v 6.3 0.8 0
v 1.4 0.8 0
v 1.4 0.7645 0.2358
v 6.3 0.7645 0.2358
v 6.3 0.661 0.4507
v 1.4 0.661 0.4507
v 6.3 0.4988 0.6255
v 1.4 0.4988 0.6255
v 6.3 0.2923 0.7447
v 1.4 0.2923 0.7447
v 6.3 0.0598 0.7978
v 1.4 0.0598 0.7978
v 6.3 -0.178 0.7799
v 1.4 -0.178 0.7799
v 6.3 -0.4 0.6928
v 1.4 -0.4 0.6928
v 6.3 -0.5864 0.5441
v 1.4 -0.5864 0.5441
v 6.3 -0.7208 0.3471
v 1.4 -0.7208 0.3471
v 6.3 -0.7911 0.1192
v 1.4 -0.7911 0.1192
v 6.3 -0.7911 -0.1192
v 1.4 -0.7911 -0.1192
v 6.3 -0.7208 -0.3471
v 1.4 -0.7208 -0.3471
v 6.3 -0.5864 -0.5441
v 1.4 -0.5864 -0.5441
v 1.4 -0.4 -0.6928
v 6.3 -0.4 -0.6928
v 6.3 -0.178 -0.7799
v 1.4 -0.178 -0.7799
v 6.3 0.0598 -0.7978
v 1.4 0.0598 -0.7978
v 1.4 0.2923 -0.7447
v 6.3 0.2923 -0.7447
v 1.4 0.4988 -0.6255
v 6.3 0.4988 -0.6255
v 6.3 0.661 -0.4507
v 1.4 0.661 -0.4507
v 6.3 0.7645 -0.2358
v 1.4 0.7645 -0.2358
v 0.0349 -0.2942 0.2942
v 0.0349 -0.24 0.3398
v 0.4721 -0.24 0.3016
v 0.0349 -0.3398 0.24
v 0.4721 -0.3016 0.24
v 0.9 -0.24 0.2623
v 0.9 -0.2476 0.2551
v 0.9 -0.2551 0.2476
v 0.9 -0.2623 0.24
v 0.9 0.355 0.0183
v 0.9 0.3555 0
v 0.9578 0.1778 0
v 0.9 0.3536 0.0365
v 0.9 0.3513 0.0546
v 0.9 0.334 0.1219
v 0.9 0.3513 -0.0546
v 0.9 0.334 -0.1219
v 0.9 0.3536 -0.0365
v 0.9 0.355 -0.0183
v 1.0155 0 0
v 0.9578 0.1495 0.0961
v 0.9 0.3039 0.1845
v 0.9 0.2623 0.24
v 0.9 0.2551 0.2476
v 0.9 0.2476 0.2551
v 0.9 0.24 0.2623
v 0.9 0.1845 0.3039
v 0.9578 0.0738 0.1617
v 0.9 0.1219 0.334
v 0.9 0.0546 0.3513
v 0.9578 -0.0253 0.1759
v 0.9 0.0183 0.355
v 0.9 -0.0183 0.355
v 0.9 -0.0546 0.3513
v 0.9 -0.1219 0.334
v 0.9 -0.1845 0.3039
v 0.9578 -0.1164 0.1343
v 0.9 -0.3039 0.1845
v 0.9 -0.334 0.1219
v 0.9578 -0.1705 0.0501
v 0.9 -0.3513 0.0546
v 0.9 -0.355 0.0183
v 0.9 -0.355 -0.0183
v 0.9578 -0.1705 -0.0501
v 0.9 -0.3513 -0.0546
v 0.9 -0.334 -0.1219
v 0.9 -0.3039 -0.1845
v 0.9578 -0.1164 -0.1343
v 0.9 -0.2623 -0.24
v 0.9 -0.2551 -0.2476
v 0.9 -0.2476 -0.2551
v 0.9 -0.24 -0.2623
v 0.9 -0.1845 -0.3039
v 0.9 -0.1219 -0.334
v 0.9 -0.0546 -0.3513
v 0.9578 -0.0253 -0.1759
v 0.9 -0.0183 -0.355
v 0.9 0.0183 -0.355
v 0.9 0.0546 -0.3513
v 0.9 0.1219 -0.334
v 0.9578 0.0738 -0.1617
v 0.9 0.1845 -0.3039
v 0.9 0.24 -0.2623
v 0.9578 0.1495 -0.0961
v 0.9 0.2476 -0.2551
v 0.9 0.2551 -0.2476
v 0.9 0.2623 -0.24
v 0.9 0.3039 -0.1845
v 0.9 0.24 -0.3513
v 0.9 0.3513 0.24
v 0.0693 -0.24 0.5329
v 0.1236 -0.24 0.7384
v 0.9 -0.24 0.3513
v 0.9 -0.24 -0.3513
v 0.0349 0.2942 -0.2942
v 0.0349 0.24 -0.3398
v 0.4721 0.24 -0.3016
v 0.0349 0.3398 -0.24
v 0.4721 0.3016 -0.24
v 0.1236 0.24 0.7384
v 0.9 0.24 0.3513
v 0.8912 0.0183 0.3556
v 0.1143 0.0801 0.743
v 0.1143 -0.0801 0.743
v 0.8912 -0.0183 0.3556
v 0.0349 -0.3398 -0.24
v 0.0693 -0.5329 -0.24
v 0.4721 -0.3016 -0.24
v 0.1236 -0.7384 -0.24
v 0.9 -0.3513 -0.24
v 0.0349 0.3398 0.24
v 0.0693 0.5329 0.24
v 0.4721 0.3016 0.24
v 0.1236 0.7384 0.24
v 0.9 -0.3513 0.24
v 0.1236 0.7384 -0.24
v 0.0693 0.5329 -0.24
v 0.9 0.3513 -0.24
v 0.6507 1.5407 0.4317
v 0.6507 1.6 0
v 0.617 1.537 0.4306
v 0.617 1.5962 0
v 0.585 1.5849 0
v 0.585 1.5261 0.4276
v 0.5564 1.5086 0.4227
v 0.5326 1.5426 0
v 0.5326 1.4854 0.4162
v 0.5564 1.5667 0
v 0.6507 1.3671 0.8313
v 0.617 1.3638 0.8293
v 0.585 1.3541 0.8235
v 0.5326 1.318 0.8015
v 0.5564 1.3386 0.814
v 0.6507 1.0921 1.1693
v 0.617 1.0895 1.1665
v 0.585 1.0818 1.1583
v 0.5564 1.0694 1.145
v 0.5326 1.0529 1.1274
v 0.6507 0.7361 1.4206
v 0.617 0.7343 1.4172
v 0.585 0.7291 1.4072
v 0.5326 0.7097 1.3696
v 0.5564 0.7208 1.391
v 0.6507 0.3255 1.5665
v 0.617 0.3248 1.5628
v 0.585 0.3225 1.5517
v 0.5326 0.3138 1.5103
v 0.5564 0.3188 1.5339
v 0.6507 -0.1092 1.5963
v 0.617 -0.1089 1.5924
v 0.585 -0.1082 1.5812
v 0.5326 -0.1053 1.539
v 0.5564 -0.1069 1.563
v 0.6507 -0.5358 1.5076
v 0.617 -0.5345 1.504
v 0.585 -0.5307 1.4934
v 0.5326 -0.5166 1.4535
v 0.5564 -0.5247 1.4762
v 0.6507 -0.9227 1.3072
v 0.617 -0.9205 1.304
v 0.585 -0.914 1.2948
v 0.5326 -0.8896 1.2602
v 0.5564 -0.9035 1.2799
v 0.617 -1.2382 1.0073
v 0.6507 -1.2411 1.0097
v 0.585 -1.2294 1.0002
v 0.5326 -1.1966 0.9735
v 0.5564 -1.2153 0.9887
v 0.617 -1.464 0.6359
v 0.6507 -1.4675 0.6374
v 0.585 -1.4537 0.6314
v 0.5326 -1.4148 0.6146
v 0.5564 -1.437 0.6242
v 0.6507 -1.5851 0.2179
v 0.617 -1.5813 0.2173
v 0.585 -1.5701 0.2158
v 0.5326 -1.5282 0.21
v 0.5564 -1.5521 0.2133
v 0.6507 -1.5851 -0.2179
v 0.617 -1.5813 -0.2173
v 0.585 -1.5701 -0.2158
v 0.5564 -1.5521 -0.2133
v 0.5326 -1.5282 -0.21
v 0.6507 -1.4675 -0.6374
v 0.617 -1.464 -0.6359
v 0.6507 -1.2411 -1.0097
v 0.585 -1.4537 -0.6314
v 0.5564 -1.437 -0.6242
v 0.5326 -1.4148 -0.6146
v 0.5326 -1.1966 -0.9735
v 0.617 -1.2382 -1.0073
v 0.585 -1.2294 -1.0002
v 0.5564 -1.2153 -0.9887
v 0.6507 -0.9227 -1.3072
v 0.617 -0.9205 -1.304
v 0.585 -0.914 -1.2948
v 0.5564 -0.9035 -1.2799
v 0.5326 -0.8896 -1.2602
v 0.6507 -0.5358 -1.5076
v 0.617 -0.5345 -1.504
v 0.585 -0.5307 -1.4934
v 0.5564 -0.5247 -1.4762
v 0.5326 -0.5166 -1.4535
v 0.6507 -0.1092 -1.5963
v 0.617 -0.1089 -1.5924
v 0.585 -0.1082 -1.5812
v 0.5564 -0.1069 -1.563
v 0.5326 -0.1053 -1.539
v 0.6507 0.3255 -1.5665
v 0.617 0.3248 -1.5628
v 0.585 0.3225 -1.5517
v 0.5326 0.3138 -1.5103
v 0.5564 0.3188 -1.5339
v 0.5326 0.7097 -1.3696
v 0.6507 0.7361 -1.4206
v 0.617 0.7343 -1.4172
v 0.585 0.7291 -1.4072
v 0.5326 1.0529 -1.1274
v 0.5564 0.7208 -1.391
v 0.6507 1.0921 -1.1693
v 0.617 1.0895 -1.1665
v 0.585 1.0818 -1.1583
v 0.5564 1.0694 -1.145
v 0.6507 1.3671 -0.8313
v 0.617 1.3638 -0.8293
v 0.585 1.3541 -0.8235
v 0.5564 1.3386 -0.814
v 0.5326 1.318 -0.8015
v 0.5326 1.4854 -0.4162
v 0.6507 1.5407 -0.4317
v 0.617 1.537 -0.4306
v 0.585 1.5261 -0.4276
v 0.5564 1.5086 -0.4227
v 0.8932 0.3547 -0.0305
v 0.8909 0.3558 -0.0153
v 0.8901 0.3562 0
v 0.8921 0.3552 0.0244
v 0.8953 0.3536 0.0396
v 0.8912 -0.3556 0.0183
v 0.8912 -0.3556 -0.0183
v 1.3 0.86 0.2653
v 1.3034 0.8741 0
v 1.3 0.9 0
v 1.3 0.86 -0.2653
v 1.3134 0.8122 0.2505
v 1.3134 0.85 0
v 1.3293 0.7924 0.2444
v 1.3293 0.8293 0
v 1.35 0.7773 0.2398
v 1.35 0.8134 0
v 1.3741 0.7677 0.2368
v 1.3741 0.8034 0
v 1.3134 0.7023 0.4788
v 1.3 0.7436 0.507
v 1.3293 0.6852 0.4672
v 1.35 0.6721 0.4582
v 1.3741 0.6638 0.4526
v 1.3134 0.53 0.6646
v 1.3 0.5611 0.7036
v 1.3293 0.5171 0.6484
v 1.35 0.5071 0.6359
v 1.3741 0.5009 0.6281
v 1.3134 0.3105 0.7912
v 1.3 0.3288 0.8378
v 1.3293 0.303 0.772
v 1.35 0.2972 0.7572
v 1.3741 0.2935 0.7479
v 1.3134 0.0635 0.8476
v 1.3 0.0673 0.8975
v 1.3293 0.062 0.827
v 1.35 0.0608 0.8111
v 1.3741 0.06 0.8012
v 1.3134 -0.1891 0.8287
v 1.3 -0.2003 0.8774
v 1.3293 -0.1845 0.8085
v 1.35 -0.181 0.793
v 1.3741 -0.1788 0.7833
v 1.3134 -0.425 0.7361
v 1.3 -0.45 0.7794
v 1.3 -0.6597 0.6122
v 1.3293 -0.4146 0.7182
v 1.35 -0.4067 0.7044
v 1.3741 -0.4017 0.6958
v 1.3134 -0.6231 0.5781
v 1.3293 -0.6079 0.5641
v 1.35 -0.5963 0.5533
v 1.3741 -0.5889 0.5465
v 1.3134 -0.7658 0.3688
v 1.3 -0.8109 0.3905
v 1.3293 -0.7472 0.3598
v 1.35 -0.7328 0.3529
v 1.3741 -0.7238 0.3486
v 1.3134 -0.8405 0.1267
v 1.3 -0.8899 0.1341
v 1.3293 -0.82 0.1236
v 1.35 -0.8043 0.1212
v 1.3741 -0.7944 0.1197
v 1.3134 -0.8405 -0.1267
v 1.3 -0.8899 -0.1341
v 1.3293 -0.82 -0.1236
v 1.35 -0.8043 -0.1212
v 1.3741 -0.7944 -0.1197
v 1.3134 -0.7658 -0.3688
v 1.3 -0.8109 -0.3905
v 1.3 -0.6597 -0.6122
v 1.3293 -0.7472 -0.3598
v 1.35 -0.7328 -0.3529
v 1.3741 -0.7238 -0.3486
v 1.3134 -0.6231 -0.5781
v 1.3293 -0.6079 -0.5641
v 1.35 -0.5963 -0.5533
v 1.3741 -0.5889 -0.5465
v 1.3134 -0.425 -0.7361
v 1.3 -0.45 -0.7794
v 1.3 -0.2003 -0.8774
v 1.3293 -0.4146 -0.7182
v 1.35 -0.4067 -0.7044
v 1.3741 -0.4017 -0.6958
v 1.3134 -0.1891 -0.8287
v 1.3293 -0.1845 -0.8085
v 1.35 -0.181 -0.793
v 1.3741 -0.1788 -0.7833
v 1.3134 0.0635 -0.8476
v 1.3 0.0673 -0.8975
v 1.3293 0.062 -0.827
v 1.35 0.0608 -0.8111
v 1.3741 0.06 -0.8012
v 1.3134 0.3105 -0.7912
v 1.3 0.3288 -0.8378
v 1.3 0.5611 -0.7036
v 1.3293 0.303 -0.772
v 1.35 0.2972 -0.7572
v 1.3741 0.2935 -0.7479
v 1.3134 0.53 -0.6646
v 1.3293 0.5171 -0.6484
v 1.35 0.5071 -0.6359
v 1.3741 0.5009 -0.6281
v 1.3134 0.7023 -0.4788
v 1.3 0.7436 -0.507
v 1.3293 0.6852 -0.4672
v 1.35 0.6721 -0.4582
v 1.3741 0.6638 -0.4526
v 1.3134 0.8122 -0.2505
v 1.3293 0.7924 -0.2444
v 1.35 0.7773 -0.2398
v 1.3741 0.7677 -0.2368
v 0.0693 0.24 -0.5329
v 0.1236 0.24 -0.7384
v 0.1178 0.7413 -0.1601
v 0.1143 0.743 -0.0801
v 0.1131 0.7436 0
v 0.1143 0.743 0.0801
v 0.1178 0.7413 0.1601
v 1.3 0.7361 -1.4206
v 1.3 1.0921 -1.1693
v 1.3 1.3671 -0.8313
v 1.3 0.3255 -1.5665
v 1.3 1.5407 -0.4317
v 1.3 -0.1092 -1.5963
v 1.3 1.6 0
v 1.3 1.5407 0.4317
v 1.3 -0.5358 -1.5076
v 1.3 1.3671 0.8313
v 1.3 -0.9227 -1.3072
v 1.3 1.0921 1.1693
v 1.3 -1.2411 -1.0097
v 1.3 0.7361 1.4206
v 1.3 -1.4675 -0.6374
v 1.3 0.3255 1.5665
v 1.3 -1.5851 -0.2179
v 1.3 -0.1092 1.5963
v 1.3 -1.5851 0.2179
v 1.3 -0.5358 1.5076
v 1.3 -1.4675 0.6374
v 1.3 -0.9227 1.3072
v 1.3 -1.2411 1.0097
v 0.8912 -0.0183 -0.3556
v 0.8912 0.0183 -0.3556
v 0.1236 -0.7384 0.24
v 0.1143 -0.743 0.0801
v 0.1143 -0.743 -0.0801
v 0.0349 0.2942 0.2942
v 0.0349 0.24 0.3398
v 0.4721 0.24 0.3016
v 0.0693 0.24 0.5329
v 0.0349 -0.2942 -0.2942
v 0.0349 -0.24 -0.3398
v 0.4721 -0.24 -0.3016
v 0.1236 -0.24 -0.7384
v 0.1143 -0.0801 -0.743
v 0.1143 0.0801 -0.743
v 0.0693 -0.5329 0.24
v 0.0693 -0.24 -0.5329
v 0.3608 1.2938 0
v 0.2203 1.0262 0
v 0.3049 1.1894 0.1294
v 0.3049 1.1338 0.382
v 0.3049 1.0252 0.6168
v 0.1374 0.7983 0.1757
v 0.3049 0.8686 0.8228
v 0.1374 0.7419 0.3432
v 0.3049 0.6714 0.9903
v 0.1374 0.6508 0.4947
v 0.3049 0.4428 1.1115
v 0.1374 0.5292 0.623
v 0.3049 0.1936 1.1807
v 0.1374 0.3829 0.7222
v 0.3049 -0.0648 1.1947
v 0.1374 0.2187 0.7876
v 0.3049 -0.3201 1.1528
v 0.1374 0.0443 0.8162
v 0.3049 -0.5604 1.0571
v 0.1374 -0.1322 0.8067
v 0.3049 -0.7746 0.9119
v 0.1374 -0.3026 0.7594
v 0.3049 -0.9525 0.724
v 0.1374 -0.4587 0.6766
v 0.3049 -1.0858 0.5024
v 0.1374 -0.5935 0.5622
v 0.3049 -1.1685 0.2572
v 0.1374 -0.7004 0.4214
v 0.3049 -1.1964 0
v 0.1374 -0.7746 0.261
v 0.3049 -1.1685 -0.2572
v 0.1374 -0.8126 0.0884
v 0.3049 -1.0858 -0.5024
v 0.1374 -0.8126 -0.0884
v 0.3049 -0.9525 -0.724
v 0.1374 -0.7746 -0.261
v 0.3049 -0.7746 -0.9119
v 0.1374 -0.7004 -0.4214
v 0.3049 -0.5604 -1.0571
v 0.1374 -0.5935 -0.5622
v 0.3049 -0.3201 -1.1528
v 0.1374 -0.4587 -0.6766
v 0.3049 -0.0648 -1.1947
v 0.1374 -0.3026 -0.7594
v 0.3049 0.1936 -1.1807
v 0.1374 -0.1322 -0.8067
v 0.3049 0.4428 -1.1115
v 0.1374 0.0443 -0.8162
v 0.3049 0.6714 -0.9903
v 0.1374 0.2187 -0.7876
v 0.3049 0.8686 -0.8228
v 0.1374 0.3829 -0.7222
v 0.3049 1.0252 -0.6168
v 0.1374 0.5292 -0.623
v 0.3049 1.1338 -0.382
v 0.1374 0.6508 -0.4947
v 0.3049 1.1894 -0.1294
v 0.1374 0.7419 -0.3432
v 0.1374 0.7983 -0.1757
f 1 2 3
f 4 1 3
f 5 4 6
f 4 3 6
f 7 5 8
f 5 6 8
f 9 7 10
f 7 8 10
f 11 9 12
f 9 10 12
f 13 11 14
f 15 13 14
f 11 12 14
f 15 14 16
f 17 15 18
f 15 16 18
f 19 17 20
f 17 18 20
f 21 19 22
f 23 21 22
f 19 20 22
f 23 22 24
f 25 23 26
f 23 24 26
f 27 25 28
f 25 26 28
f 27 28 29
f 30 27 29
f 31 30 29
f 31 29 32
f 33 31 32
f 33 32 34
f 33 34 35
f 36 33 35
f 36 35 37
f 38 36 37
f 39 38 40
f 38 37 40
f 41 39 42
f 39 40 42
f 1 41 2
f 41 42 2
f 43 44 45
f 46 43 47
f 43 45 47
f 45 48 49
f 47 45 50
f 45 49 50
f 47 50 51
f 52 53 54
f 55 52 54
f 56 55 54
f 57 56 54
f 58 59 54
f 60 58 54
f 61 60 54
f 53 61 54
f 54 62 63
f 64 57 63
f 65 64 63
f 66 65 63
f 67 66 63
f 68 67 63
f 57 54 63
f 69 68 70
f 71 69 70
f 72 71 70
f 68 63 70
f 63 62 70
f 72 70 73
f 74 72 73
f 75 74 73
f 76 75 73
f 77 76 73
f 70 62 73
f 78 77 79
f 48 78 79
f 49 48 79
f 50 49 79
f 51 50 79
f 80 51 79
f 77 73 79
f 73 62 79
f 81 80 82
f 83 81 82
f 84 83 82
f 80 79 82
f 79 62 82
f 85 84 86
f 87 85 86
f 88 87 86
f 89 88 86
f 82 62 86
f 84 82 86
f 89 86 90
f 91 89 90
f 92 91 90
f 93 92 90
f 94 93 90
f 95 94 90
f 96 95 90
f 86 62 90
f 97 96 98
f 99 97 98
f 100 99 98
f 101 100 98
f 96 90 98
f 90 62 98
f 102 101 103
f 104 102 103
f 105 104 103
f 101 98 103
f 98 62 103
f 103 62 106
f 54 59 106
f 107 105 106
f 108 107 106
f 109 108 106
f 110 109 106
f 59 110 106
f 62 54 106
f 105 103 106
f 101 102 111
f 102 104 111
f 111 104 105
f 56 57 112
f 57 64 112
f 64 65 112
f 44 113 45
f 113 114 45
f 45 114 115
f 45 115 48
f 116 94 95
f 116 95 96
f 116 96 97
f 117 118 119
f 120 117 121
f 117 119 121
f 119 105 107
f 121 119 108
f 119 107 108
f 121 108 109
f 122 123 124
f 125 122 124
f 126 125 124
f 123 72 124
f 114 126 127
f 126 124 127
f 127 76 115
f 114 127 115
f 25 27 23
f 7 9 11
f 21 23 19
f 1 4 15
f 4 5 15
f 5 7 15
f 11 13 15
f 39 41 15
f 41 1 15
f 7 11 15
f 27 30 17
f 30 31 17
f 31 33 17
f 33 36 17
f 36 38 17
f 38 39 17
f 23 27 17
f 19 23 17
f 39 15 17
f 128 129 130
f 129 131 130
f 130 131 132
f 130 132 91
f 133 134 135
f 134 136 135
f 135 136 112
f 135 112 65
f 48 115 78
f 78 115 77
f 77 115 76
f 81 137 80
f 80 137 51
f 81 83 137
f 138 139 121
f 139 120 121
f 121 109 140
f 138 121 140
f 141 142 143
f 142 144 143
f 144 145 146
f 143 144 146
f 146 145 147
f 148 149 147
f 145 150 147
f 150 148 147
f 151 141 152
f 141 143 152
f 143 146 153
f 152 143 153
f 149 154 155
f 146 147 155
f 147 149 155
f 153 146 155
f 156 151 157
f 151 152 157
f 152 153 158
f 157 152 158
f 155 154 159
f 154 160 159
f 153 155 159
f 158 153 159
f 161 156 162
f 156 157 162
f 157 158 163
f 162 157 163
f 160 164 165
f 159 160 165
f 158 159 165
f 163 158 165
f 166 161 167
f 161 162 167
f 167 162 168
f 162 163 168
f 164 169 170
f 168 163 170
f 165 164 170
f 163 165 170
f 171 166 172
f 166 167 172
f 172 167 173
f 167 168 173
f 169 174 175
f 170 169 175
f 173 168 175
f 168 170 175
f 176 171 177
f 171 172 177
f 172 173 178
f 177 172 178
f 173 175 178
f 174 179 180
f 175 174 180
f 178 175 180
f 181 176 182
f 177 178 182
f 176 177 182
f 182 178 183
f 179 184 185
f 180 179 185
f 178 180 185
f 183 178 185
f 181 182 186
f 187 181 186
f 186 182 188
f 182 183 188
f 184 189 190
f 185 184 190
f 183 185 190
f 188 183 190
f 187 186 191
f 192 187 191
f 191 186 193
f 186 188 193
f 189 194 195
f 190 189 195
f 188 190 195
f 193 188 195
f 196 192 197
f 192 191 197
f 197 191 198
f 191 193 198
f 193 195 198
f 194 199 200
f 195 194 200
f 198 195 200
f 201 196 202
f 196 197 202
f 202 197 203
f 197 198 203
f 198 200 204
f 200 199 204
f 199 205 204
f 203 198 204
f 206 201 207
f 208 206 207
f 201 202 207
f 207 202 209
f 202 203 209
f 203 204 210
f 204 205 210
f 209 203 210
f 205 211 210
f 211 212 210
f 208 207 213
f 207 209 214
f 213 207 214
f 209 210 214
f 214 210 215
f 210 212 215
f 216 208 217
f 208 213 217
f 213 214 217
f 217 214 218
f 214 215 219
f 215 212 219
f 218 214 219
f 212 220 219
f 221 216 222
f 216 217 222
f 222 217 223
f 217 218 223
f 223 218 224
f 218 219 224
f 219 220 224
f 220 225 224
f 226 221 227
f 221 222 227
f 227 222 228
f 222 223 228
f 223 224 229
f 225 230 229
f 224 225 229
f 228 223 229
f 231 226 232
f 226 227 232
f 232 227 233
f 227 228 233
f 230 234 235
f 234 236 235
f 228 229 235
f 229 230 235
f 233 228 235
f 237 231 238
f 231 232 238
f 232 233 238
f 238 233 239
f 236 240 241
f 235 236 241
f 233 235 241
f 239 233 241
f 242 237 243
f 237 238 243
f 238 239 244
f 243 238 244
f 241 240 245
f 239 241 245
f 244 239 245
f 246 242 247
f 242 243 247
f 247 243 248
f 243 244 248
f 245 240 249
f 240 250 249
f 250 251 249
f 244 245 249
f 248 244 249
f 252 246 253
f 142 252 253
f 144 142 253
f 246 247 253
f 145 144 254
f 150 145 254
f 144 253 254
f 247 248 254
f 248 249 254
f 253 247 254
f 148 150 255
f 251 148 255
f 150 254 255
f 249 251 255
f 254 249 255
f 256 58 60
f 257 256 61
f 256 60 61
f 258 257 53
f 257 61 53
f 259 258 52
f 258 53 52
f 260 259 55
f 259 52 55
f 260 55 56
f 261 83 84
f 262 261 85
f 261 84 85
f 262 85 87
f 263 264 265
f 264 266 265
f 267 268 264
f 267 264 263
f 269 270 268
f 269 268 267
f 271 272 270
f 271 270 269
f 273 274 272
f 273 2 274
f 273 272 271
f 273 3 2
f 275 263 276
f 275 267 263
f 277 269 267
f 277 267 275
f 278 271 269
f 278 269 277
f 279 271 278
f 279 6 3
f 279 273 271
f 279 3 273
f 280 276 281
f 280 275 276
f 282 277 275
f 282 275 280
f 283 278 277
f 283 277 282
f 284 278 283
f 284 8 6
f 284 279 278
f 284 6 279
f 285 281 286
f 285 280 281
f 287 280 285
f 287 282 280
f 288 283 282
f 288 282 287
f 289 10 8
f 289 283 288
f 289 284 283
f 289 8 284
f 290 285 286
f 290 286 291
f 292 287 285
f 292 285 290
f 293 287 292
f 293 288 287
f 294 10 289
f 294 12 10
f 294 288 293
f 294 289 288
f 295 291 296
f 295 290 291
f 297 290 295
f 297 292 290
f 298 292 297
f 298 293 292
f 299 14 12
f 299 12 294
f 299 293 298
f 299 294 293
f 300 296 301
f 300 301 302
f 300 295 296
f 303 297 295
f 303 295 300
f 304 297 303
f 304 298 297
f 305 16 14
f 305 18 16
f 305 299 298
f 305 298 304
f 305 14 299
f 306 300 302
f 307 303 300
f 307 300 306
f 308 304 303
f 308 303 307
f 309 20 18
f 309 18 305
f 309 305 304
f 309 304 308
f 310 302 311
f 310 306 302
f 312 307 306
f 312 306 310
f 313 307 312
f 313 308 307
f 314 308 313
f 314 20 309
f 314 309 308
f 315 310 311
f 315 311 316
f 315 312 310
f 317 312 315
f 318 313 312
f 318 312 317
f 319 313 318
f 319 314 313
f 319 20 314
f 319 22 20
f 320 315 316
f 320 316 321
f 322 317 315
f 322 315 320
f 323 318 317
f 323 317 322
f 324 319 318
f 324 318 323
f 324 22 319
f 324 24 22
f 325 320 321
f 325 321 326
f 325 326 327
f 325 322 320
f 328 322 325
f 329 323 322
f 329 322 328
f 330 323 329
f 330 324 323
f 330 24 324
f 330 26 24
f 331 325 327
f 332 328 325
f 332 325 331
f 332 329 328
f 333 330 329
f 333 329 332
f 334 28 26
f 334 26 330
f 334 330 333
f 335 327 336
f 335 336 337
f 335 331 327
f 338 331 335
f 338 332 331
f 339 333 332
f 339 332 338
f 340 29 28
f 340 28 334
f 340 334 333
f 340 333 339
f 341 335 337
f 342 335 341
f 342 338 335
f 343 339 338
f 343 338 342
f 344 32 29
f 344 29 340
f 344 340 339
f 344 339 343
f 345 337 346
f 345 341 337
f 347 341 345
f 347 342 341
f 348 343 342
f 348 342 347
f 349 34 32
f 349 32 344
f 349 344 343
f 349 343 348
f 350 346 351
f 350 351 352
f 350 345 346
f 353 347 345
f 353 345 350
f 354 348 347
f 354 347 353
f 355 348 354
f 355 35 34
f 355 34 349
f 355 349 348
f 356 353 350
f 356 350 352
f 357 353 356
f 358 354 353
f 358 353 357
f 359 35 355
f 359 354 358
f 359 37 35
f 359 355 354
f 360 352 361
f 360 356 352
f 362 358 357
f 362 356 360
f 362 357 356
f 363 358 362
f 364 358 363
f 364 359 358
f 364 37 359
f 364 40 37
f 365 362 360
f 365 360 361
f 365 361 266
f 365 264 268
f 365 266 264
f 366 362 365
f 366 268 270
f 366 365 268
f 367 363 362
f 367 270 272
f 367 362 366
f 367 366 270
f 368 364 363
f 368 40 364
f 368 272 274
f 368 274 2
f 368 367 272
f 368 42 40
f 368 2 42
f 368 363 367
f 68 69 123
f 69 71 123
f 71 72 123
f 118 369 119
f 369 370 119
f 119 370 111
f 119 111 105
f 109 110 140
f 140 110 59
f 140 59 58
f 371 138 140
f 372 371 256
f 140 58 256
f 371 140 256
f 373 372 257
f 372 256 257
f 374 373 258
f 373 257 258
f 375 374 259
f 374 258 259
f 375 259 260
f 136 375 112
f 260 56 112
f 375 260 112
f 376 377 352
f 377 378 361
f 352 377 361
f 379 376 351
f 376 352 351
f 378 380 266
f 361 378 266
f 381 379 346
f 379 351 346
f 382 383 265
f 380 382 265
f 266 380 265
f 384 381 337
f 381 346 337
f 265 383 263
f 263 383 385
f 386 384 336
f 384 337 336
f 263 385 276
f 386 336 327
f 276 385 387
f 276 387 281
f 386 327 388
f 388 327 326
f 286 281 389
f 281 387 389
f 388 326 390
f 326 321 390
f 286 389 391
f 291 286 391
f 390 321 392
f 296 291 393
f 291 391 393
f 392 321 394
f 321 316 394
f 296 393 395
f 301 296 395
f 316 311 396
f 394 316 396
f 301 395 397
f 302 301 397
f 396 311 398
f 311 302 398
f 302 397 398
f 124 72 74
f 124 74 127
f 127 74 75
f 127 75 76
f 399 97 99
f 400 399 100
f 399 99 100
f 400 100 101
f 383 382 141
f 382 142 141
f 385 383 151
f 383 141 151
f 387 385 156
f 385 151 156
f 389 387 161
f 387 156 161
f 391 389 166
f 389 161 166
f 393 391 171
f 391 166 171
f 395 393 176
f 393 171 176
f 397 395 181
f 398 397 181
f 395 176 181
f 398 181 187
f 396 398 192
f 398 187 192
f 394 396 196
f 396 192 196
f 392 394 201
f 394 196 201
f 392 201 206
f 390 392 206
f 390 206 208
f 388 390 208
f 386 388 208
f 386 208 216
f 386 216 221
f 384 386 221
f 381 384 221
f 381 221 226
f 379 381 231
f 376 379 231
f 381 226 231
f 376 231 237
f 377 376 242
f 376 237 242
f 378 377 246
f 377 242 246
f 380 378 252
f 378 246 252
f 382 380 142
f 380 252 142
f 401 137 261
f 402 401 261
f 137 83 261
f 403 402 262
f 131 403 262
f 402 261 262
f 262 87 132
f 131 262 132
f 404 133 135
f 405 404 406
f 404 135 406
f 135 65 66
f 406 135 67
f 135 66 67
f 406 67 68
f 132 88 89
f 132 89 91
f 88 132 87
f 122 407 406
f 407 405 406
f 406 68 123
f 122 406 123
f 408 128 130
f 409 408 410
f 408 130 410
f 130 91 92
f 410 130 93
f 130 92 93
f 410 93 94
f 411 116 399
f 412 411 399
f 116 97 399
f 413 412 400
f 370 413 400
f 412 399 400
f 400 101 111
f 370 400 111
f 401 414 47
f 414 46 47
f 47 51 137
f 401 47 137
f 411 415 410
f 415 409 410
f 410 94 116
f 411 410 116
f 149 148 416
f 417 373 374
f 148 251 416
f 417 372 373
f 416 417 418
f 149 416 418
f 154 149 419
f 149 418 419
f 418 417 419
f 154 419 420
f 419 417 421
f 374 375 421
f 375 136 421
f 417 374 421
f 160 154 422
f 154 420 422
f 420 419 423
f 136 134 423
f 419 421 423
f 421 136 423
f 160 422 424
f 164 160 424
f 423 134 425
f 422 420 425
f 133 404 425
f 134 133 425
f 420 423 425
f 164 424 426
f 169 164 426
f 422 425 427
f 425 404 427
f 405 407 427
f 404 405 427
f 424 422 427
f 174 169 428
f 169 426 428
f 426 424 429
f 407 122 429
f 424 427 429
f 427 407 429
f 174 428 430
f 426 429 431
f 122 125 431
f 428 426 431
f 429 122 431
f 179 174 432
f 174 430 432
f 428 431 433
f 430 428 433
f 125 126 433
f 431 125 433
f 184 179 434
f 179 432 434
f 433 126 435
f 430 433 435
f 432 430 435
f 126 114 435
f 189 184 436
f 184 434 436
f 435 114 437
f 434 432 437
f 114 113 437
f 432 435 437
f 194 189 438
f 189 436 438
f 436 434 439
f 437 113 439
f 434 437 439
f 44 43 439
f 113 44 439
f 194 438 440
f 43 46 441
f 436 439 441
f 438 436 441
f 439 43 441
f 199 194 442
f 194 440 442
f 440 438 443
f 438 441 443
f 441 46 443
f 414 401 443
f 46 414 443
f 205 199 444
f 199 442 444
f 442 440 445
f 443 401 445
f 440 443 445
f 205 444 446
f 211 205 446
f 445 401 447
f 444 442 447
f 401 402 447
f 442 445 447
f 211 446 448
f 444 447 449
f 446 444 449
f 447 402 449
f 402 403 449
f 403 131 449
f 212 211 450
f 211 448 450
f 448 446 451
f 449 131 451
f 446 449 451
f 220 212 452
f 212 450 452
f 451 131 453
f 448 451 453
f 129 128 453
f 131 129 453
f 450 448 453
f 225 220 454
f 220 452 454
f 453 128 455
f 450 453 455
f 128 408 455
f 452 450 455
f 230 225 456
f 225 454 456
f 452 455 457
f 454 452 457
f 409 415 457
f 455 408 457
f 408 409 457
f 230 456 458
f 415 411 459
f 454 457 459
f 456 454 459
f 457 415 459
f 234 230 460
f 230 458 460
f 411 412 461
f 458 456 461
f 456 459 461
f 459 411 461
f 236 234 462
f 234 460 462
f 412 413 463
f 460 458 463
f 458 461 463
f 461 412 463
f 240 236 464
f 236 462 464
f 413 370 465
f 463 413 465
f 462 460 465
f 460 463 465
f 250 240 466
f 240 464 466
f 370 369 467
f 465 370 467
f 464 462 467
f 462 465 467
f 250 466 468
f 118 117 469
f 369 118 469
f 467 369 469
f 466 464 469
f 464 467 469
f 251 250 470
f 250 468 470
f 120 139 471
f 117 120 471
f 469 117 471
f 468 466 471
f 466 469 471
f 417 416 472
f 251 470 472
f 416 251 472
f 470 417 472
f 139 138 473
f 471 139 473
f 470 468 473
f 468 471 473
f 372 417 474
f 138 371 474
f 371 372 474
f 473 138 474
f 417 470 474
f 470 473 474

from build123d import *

# Parameters (mm, degrees)
FILLET1_R    = 0.1
SKETCH3_W    = 0.48
SKETCH3_H    = 1.6
SKETCH4_W    = 0.48
SKETCH4_H    = 0.702553256
RECPAT_COUNT = 2
RECPAT_ANGLE = 90


with BuildPart() as part:
    # BodySke → Base-Revolve (revolve)
    with BuildSketch(Plane.XY):
        with BuildLine():
            Line((1.3, 0.8), (1.3, 1.6))
            Line((1.3, 1.6), (0.650675799, 1.6))
            ThreePointArc((0.650675799, 1.6), (0.585036553, 1.584875829), (0.532633829, 1.542553191))
            ThreePointArc((0.532633829, 1.542553191), (0.136907172, 0.815960959), (0, 0))
            Line((0, 0), (6.3, 0))
            Line((6.3, 0), (6.3, 0.8))
            Line((6.3, 0.8), (1.3, 0.8))
        make_face()
    revolve(axis=Axis((-25.4, 0, 0), (1, 0, 0)))

    # Fillet1
    fillet1_edges = [part.edges().sort_by_distance(p)[0] for p in [
        (1.3, -0.8, 0),
    ]]
    fillet(fillet1_edges, radius=FILLET1_R)

    # Sketch3 → Recess section 0
    with BuildSketch(Plane(origin=(0, 0, 0), x_dir=(0, 0, -1), z_dir=(1, 0, 0))):
        Rectangle(SKETCH3_W, SKETCH3_H)
    # Sketch4 → Recess section 1
    with BuildSketch(Plane(origin=(0.9, 0, 0), x_dir=(0, 0, -1), z_dir=(1, 0, 0))):
        Rectangle(SKETCH4_W, SKETCH4_H)
    recess = loft(mode=Mode.SUBTRACT)

    # RecPat: Recess ×2 about axis
    recpat_axis = Axis((0, 0, 0), (1, 0, 0))
    for i in range(1, RECPAT_COUNT):
        add(recess.rotate(recpat_axis, i * RECPAT_ANGLE / (RECPAT_COUNT - 1)), mode=Mode.SUBTRACT)

    # RecCorSke → RecessCore (revolve, cut)
    with BuildSketch(Plane.XY):
        Polygon((0, 0), (0, 0.418434131), (0.9, 0.3555), (1.015508952, 0), align=None)
    revolve(axis=Axis((-3.175, 0, 0), (1, 0, 0)), mode=Mode.SUBTRACT)


solid = part.part
